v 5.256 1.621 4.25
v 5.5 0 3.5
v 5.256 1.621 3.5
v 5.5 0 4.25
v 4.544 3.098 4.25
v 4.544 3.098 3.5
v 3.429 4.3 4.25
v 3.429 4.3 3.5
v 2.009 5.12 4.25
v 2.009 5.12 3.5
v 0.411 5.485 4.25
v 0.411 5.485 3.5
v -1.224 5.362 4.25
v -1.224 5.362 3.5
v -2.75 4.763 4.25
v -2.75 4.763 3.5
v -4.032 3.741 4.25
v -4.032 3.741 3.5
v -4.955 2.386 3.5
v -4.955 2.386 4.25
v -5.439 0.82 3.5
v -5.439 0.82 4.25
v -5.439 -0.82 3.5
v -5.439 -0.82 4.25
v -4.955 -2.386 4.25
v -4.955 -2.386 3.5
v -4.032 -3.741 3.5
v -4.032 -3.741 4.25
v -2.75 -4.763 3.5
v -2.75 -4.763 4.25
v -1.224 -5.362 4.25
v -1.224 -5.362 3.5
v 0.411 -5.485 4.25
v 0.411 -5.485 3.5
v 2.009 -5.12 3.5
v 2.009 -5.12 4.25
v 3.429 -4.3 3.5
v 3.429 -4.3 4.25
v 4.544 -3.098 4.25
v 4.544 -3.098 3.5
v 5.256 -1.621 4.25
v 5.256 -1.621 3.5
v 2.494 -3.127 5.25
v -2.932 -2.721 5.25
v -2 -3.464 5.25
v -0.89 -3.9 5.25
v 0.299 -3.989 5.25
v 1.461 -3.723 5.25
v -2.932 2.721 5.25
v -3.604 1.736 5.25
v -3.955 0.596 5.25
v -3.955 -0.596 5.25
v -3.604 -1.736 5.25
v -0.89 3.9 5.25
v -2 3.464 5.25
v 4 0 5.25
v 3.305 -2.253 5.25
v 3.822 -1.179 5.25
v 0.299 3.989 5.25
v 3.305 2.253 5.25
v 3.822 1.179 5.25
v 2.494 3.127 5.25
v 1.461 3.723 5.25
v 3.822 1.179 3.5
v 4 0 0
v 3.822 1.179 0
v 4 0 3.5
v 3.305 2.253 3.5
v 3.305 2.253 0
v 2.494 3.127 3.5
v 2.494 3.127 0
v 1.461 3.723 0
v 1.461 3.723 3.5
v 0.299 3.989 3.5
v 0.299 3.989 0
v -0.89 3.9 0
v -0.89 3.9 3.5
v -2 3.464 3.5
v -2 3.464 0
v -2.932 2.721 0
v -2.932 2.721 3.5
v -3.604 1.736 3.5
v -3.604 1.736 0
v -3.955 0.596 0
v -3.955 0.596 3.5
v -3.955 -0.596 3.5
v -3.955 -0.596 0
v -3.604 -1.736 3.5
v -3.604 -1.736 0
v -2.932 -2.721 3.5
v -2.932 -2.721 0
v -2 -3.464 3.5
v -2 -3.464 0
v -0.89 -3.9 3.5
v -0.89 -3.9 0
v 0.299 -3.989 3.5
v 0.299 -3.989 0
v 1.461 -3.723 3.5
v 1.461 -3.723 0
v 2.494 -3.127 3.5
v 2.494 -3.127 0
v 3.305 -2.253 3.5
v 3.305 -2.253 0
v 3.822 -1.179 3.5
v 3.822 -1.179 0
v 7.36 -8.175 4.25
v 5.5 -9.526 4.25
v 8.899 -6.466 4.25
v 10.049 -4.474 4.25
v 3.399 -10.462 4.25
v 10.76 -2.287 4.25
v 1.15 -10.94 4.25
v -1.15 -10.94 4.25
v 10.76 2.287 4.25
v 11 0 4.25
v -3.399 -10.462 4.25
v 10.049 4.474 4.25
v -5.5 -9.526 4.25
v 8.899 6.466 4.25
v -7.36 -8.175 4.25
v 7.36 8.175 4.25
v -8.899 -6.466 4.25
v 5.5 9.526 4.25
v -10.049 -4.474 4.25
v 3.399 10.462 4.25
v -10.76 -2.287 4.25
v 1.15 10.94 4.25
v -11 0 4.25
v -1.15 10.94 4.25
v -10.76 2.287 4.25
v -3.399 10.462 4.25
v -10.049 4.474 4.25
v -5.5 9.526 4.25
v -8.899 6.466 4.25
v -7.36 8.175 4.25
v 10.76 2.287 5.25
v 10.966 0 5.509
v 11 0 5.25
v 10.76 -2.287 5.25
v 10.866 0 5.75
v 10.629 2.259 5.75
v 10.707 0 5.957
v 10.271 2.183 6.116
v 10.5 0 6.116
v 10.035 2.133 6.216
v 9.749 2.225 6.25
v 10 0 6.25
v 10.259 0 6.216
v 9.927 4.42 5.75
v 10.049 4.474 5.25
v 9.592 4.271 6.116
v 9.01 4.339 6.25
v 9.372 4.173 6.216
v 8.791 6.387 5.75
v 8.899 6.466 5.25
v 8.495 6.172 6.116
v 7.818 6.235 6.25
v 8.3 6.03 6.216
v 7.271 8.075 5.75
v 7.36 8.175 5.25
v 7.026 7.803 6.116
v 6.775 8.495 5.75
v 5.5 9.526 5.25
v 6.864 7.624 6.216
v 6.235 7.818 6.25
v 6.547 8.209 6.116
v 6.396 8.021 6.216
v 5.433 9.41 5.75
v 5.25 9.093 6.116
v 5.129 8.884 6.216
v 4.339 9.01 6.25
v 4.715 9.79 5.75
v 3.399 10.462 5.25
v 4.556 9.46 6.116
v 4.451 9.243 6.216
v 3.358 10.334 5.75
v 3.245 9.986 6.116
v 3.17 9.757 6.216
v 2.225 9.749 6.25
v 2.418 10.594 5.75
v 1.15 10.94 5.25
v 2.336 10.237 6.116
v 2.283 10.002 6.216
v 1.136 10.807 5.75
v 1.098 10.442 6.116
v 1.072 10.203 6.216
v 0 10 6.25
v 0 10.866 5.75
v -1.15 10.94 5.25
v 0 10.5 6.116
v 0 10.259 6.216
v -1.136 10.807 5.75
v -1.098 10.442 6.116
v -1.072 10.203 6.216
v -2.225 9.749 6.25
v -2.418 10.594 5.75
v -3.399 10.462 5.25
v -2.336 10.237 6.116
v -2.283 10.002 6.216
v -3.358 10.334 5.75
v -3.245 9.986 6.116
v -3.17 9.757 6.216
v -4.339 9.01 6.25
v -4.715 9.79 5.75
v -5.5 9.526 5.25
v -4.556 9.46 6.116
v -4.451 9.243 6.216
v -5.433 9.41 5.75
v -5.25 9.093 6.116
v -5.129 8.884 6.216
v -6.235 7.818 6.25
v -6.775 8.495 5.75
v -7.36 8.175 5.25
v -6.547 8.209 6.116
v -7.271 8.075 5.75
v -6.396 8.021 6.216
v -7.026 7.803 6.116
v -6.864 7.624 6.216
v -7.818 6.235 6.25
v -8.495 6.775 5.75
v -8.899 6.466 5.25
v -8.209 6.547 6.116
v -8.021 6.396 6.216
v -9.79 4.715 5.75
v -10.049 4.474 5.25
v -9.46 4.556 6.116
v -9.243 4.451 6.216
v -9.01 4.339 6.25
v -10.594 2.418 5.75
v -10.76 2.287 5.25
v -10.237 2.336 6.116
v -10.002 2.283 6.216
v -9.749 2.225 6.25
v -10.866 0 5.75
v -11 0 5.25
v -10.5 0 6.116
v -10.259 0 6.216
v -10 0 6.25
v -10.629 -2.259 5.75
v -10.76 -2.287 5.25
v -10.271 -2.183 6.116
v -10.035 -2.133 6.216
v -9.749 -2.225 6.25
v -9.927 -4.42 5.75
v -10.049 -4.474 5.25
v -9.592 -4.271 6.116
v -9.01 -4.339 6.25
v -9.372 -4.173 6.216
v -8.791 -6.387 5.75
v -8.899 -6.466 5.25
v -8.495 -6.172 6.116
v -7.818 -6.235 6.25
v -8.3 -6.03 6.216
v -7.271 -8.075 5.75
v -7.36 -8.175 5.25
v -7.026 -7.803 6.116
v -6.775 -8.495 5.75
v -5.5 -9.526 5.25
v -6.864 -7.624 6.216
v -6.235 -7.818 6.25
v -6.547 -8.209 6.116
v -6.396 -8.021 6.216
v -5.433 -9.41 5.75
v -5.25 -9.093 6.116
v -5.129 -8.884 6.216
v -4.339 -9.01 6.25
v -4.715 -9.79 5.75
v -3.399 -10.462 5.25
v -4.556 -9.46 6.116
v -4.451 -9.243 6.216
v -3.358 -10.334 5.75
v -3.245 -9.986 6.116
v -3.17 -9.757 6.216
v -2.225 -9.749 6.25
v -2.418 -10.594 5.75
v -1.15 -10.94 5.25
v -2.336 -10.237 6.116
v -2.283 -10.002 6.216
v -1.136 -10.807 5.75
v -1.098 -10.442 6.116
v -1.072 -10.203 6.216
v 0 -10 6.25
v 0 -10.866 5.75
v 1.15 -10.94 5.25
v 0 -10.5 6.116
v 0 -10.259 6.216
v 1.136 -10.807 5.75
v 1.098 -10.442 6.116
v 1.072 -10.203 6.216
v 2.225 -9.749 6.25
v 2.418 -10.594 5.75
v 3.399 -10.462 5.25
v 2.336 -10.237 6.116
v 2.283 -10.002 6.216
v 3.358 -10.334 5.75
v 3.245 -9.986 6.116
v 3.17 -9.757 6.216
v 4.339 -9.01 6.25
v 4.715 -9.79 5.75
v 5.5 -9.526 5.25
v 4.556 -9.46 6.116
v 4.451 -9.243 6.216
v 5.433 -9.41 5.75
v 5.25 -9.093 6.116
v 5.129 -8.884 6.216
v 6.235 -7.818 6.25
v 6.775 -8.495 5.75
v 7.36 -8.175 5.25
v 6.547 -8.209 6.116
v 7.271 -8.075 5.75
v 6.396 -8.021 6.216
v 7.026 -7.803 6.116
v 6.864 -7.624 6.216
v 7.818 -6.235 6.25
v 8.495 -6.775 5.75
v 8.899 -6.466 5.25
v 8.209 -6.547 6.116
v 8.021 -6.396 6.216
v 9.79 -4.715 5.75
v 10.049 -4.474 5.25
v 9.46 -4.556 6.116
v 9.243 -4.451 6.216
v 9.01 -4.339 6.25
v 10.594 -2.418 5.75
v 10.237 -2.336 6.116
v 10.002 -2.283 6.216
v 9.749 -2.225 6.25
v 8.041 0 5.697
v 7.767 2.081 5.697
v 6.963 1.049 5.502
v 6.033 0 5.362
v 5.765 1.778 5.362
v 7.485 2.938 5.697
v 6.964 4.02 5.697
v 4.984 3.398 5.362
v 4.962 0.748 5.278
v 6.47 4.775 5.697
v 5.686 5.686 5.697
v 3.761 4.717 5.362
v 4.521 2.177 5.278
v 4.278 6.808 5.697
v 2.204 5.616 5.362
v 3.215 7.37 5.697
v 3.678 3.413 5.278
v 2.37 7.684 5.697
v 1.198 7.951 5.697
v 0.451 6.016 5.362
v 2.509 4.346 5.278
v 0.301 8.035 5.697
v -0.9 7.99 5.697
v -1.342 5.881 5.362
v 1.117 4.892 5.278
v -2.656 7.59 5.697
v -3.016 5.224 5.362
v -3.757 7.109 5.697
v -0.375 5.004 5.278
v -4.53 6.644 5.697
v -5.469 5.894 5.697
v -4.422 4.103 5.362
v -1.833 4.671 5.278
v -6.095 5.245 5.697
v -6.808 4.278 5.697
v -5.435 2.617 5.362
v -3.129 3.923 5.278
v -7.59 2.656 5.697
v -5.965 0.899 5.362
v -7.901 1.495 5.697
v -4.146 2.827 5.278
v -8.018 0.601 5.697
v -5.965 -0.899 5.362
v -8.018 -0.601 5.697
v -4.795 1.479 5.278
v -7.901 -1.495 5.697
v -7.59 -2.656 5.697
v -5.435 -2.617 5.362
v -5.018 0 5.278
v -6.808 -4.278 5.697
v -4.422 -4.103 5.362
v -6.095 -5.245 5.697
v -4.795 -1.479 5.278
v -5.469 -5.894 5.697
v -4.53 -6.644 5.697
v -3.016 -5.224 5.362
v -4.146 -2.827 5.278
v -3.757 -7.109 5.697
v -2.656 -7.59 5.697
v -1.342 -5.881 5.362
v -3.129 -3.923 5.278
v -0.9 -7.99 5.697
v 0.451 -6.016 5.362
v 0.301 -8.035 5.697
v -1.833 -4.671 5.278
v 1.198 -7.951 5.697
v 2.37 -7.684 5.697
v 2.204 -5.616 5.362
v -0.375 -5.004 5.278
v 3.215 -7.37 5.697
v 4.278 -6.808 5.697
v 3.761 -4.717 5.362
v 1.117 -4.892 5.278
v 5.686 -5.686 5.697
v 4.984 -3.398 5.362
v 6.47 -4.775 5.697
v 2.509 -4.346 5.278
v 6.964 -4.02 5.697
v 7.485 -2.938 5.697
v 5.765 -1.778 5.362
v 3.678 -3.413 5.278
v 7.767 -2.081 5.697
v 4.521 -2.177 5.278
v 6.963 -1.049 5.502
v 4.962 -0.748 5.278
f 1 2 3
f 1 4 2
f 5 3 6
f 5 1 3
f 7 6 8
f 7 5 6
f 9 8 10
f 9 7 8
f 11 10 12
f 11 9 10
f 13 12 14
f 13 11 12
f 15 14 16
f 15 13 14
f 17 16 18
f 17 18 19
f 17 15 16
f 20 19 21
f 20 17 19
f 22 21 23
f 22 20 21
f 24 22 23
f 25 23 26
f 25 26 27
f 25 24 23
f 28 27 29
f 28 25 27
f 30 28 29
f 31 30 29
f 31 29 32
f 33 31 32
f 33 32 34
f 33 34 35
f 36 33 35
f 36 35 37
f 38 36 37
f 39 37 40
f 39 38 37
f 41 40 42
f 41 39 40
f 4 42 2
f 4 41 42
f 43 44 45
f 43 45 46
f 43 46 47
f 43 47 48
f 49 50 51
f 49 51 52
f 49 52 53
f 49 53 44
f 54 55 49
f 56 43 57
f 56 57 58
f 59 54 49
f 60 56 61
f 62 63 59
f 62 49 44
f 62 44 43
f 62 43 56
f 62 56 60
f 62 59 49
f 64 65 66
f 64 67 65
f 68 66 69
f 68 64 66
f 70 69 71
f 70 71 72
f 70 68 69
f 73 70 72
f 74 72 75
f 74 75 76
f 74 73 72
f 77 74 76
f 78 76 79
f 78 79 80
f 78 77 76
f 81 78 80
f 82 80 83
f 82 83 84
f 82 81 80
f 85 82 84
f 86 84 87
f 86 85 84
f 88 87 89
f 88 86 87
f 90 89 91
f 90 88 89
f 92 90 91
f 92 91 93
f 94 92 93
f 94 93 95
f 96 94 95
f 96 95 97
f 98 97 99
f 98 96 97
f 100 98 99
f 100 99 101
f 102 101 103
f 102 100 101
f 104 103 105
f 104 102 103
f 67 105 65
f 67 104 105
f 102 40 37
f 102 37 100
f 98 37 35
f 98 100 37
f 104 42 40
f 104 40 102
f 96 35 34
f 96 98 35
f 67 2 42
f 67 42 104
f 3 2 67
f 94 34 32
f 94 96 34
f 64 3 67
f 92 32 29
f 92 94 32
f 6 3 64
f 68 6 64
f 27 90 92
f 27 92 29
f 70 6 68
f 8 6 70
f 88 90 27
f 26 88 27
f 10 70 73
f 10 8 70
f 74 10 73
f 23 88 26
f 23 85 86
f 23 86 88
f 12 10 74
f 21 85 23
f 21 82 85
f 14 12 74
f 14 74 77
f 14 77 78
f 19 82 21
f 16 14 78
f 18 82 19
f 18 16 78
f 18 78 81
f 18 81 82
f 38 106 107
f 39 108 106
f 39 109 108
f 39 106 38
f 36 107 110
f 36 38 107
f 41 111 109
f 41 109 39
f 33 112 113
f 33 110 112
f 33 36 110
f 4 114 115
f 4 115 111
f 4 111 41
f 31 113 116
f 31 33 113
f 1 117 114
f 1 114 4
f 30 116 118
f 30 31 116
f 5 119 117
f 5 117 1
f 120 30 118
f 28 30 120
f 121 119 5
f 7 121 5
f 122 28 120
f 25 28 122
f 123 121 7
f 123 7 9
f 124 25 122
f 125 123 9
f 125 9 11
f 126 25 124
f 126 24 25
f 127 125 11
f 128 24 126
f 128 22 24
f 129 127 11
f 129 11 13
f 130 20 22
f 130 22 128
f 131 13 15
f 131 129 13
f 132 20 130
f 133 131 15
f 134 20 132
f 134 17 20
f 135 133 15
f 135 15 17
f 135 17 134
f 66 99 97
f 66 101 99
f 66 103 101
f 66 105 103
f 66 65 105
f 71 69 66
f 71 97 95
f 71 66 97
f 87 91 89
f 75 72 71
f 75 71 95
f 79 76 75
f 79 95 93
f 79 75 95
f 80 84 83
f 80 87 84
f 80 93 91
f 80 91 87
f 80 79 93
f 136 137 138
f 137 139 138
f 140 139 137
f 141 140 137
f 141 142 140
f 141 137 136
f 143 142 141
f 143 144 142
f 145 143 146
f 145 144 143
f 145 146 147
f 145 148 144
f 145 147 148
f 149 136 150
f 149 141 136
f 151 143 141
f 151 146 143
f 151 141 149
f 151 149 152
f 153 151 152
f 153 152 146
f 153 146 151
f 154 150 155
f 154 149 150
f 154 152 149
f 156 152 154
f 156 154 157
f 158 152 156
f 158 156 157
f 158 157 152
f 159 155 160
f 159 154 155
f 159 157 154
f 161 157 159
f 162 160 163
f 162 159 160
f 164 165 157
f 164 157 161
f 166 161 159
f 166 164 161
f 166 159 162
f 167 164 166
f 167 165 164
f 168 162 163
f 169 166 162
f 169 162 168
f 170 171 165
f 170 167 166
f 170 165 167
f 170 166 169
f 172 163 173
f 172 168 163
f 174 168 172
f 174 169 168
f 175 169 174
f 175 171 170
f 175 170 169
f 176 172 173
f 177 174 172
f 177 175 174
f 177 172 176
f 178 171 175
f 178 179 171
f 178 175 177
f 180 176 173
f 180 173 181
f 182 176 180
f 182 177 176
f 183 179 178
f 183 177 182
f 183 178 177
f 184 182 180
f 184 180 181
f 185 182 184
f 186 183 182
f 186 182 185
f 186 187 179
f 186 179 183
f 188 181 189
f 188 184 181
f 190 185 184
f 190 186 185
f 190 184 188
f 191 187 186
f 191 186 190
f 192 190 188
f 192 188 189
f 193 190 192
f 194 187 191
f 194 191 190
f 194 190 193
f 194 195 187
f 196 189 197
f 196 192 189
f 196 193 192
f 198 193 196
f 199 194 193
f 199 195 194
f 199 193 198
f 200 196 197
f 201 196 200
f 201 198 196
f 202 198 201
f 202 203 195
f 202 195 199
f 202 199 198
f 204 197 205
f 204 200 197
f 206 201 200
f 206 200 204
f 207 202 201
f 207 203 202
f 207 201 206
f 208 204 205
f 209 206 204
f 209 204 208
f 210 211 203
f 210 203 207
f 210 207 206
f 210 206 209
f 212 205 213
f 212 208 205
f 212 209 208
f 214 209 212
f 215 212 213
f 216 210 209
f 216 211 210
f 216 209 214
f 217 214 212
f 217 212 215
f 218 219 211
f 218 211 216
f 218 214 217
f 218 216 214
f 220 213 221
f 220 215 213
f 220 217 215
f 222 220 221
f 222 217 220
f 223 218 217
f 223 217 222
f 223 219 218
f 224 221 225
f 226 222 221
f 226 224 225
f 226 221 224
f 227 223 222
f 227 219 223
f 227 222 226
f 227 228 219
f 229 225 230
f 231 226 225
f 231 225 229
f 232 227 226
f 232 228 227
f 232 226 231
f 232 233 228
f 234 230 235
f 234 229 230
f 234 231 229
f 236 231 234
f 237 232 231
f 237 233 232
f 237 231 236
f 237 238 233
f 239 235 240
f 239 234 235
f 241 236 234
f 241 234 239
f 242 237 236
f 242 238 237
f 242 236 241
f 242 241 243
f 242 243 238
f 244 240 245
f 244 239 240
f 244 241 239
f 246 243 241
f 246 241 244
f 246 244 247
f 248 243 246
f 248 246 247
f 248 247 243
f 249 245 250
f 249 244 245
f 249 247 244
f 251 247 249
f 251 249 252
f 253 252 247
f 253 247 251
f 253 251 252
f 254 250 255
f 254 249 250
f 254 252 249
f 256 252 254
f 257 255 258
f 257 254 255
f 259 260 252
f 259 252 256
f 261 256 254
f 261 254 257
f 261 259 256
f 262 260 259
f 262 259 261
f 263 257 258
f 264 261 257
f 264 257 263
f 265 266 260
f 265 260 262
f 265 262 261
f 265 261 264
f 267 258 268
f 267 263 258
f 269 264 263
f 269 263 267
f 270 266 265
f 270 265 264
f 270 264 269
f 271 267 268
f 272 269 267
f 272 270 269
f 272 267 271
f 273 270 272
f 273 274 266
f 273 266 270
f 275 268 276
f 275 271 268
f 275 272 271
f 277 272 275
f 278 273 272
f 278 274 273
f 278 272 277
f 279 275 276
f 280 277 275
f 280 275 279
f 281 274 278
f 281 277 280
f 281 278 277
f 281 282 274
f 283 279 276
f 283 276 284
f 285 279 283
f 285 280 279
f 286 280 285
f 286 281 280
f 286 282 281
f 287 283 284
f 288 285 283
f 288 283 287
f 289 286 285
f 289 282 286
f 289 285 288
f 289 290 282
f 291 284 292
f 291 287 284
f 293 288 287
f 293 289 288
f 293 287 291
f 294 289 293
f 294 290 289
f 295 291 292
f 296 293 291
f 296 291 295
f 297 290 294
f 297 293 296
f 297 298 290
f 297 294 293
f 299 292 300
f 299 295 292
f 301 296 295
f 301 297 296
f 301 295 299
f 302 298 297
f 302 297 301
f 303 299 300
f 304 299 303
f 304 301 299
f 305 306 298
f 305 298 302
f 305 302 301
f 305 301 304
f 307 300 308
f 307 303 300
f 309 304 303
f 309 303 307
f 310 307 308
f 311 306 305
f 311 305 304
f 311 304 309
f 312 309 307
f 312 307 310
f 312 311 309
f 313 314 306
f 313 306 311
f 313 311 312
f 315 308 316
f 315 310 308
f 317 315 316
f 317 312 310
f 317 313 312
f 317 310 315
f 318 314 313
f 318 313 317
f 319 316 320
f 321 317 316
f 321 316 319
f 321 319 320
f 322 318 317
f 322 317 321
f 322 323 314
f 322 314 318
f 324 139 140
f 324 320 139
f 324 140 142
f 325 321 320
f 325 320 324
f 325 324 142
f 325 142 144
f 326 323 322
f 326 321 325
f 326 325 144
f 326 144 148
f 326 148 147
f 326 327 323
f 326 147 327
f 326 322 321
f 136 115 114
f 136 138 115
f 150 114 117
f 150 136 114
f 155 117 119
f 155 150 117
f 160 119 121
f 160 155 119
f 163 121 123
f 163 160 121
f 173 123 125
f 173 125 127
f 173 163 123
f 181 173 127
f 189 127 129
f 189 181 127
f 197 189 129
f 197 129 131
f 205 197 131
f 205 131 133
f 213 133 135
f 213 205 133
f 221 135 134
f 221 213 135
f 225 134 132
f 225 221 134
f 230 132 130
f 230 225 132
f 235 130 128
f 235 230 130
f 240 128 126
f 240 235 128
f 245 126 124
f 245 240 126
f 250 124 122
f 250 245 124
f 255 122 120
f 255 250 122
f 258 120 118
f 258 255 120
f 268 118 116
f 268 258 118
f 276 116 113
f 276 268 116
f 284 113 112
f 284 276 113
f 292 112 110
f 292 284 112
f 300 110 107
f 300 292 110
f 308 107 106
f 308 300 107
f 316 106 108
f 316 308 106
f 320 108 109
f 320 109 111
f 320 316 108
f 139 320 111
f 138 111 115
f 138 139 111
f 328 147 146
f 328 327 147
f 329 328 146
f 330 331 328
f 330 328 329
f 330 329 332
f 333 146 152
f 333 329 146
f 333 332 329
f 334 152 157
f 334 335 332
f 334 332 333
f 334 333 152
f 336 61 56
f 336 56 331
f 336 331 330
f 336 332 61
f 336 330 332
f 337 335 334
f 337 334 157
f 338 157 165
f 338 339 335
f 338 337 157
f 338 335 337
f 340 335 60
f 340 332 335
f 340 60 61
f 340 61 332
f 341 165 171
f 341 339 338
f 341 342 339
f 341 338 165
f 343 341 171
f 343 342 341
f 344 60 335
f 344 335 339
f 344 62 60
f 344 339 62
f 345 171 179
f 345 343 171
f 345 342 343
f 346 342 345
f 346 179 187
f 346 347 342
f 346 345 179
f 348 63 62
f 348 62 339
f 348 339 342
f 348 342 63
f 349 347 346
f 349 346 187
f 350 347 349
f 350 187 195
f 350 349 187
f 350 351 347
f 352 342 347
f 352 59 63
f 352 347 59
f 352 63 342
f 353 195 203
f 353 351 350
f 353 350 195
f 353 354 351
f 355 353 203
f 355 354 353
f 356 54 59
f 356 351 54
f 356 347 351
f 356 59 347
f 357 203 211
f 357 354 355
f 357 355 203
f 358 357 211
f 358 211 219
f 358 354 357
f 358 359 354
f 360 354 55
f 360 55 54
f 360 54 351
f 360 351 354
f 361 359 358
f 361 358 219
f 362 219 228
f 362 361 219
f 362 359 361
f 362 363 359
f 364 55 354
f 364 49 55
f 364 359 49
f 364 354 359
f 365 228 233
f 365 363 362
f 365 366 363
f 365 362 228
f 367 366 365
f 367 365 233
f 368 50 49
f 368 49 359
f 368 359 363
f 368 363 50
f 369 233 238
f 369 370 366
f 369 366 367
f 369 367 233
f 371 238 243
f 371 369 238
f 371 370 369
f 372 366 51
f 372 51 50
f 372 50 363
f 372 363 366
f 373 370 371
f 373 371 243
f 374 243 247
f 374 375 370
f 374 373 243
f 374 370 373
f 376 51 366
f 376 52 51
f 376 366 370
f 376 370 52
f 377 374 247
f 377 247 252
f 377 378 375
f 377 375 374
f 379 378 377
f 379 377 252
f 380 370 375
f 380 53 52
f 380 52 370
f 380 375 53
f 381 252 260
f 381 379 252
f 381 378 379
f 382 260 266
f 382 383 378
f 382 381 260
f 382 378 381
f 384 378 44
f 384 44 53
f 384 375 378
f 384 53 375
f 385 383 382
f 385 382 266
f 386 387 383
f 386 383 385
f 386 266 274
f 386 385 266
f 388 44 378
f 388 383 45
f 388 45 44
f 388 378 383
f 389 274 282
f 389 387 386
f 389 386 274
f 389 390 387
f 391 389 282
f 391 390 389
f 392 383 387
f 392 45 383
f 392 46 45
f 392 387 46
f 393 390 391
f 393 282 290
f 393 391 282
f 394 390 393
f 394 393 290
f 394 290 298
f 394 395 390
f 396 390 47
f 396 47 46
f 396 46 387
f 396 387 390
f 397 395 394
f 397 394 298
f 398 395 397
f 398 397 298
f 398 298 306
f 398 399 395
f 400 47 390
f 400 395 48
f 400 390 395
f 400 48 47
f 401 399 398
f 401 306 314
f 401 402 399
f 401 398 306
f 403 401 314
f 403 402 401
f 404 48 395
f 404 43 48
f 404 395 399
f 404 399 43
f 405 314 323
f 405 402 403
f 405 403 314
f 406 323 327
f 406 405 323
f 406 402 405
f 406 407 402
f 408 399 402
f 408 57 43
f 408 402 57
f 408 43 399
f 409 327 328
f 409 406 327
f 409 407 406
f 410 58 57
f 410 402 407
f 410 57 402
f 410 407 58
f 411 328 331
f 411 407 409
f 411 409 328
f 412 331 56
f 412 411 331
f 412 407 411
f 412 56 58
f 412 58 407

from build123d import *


with BuildPart() as f1:
    # F0 (on Front) → F1 (revolve)
    with BuildSketch(Plane.XZ):
        with BuildLine():
            Line((0, 5.25), (0, 0))
            Line((0, 0), (4, 0))
            Line((4, 0), (4, 3.5))
            Line((4, 3.5), (5.5, 3.5))
            Line((5.5, 3.5), (5.5, 4.25))
            Line((5.5, 4.25), (11, 4.25))
            Line((11, 4.25), (11, 5.25))
            ThreePointArc((11, 5.25), (10.707107, 5.957107), (10, 6.25))
            ThreePointArc((10, 6.25), (7.041381, 5.501712), (4, 5.25))
            Line((4, 5.25), (0, 5.25))
        make_face()
    revolve(axis=Axis((0, 0, 2.625), (0, 0, 1)))


solid = f1.part
